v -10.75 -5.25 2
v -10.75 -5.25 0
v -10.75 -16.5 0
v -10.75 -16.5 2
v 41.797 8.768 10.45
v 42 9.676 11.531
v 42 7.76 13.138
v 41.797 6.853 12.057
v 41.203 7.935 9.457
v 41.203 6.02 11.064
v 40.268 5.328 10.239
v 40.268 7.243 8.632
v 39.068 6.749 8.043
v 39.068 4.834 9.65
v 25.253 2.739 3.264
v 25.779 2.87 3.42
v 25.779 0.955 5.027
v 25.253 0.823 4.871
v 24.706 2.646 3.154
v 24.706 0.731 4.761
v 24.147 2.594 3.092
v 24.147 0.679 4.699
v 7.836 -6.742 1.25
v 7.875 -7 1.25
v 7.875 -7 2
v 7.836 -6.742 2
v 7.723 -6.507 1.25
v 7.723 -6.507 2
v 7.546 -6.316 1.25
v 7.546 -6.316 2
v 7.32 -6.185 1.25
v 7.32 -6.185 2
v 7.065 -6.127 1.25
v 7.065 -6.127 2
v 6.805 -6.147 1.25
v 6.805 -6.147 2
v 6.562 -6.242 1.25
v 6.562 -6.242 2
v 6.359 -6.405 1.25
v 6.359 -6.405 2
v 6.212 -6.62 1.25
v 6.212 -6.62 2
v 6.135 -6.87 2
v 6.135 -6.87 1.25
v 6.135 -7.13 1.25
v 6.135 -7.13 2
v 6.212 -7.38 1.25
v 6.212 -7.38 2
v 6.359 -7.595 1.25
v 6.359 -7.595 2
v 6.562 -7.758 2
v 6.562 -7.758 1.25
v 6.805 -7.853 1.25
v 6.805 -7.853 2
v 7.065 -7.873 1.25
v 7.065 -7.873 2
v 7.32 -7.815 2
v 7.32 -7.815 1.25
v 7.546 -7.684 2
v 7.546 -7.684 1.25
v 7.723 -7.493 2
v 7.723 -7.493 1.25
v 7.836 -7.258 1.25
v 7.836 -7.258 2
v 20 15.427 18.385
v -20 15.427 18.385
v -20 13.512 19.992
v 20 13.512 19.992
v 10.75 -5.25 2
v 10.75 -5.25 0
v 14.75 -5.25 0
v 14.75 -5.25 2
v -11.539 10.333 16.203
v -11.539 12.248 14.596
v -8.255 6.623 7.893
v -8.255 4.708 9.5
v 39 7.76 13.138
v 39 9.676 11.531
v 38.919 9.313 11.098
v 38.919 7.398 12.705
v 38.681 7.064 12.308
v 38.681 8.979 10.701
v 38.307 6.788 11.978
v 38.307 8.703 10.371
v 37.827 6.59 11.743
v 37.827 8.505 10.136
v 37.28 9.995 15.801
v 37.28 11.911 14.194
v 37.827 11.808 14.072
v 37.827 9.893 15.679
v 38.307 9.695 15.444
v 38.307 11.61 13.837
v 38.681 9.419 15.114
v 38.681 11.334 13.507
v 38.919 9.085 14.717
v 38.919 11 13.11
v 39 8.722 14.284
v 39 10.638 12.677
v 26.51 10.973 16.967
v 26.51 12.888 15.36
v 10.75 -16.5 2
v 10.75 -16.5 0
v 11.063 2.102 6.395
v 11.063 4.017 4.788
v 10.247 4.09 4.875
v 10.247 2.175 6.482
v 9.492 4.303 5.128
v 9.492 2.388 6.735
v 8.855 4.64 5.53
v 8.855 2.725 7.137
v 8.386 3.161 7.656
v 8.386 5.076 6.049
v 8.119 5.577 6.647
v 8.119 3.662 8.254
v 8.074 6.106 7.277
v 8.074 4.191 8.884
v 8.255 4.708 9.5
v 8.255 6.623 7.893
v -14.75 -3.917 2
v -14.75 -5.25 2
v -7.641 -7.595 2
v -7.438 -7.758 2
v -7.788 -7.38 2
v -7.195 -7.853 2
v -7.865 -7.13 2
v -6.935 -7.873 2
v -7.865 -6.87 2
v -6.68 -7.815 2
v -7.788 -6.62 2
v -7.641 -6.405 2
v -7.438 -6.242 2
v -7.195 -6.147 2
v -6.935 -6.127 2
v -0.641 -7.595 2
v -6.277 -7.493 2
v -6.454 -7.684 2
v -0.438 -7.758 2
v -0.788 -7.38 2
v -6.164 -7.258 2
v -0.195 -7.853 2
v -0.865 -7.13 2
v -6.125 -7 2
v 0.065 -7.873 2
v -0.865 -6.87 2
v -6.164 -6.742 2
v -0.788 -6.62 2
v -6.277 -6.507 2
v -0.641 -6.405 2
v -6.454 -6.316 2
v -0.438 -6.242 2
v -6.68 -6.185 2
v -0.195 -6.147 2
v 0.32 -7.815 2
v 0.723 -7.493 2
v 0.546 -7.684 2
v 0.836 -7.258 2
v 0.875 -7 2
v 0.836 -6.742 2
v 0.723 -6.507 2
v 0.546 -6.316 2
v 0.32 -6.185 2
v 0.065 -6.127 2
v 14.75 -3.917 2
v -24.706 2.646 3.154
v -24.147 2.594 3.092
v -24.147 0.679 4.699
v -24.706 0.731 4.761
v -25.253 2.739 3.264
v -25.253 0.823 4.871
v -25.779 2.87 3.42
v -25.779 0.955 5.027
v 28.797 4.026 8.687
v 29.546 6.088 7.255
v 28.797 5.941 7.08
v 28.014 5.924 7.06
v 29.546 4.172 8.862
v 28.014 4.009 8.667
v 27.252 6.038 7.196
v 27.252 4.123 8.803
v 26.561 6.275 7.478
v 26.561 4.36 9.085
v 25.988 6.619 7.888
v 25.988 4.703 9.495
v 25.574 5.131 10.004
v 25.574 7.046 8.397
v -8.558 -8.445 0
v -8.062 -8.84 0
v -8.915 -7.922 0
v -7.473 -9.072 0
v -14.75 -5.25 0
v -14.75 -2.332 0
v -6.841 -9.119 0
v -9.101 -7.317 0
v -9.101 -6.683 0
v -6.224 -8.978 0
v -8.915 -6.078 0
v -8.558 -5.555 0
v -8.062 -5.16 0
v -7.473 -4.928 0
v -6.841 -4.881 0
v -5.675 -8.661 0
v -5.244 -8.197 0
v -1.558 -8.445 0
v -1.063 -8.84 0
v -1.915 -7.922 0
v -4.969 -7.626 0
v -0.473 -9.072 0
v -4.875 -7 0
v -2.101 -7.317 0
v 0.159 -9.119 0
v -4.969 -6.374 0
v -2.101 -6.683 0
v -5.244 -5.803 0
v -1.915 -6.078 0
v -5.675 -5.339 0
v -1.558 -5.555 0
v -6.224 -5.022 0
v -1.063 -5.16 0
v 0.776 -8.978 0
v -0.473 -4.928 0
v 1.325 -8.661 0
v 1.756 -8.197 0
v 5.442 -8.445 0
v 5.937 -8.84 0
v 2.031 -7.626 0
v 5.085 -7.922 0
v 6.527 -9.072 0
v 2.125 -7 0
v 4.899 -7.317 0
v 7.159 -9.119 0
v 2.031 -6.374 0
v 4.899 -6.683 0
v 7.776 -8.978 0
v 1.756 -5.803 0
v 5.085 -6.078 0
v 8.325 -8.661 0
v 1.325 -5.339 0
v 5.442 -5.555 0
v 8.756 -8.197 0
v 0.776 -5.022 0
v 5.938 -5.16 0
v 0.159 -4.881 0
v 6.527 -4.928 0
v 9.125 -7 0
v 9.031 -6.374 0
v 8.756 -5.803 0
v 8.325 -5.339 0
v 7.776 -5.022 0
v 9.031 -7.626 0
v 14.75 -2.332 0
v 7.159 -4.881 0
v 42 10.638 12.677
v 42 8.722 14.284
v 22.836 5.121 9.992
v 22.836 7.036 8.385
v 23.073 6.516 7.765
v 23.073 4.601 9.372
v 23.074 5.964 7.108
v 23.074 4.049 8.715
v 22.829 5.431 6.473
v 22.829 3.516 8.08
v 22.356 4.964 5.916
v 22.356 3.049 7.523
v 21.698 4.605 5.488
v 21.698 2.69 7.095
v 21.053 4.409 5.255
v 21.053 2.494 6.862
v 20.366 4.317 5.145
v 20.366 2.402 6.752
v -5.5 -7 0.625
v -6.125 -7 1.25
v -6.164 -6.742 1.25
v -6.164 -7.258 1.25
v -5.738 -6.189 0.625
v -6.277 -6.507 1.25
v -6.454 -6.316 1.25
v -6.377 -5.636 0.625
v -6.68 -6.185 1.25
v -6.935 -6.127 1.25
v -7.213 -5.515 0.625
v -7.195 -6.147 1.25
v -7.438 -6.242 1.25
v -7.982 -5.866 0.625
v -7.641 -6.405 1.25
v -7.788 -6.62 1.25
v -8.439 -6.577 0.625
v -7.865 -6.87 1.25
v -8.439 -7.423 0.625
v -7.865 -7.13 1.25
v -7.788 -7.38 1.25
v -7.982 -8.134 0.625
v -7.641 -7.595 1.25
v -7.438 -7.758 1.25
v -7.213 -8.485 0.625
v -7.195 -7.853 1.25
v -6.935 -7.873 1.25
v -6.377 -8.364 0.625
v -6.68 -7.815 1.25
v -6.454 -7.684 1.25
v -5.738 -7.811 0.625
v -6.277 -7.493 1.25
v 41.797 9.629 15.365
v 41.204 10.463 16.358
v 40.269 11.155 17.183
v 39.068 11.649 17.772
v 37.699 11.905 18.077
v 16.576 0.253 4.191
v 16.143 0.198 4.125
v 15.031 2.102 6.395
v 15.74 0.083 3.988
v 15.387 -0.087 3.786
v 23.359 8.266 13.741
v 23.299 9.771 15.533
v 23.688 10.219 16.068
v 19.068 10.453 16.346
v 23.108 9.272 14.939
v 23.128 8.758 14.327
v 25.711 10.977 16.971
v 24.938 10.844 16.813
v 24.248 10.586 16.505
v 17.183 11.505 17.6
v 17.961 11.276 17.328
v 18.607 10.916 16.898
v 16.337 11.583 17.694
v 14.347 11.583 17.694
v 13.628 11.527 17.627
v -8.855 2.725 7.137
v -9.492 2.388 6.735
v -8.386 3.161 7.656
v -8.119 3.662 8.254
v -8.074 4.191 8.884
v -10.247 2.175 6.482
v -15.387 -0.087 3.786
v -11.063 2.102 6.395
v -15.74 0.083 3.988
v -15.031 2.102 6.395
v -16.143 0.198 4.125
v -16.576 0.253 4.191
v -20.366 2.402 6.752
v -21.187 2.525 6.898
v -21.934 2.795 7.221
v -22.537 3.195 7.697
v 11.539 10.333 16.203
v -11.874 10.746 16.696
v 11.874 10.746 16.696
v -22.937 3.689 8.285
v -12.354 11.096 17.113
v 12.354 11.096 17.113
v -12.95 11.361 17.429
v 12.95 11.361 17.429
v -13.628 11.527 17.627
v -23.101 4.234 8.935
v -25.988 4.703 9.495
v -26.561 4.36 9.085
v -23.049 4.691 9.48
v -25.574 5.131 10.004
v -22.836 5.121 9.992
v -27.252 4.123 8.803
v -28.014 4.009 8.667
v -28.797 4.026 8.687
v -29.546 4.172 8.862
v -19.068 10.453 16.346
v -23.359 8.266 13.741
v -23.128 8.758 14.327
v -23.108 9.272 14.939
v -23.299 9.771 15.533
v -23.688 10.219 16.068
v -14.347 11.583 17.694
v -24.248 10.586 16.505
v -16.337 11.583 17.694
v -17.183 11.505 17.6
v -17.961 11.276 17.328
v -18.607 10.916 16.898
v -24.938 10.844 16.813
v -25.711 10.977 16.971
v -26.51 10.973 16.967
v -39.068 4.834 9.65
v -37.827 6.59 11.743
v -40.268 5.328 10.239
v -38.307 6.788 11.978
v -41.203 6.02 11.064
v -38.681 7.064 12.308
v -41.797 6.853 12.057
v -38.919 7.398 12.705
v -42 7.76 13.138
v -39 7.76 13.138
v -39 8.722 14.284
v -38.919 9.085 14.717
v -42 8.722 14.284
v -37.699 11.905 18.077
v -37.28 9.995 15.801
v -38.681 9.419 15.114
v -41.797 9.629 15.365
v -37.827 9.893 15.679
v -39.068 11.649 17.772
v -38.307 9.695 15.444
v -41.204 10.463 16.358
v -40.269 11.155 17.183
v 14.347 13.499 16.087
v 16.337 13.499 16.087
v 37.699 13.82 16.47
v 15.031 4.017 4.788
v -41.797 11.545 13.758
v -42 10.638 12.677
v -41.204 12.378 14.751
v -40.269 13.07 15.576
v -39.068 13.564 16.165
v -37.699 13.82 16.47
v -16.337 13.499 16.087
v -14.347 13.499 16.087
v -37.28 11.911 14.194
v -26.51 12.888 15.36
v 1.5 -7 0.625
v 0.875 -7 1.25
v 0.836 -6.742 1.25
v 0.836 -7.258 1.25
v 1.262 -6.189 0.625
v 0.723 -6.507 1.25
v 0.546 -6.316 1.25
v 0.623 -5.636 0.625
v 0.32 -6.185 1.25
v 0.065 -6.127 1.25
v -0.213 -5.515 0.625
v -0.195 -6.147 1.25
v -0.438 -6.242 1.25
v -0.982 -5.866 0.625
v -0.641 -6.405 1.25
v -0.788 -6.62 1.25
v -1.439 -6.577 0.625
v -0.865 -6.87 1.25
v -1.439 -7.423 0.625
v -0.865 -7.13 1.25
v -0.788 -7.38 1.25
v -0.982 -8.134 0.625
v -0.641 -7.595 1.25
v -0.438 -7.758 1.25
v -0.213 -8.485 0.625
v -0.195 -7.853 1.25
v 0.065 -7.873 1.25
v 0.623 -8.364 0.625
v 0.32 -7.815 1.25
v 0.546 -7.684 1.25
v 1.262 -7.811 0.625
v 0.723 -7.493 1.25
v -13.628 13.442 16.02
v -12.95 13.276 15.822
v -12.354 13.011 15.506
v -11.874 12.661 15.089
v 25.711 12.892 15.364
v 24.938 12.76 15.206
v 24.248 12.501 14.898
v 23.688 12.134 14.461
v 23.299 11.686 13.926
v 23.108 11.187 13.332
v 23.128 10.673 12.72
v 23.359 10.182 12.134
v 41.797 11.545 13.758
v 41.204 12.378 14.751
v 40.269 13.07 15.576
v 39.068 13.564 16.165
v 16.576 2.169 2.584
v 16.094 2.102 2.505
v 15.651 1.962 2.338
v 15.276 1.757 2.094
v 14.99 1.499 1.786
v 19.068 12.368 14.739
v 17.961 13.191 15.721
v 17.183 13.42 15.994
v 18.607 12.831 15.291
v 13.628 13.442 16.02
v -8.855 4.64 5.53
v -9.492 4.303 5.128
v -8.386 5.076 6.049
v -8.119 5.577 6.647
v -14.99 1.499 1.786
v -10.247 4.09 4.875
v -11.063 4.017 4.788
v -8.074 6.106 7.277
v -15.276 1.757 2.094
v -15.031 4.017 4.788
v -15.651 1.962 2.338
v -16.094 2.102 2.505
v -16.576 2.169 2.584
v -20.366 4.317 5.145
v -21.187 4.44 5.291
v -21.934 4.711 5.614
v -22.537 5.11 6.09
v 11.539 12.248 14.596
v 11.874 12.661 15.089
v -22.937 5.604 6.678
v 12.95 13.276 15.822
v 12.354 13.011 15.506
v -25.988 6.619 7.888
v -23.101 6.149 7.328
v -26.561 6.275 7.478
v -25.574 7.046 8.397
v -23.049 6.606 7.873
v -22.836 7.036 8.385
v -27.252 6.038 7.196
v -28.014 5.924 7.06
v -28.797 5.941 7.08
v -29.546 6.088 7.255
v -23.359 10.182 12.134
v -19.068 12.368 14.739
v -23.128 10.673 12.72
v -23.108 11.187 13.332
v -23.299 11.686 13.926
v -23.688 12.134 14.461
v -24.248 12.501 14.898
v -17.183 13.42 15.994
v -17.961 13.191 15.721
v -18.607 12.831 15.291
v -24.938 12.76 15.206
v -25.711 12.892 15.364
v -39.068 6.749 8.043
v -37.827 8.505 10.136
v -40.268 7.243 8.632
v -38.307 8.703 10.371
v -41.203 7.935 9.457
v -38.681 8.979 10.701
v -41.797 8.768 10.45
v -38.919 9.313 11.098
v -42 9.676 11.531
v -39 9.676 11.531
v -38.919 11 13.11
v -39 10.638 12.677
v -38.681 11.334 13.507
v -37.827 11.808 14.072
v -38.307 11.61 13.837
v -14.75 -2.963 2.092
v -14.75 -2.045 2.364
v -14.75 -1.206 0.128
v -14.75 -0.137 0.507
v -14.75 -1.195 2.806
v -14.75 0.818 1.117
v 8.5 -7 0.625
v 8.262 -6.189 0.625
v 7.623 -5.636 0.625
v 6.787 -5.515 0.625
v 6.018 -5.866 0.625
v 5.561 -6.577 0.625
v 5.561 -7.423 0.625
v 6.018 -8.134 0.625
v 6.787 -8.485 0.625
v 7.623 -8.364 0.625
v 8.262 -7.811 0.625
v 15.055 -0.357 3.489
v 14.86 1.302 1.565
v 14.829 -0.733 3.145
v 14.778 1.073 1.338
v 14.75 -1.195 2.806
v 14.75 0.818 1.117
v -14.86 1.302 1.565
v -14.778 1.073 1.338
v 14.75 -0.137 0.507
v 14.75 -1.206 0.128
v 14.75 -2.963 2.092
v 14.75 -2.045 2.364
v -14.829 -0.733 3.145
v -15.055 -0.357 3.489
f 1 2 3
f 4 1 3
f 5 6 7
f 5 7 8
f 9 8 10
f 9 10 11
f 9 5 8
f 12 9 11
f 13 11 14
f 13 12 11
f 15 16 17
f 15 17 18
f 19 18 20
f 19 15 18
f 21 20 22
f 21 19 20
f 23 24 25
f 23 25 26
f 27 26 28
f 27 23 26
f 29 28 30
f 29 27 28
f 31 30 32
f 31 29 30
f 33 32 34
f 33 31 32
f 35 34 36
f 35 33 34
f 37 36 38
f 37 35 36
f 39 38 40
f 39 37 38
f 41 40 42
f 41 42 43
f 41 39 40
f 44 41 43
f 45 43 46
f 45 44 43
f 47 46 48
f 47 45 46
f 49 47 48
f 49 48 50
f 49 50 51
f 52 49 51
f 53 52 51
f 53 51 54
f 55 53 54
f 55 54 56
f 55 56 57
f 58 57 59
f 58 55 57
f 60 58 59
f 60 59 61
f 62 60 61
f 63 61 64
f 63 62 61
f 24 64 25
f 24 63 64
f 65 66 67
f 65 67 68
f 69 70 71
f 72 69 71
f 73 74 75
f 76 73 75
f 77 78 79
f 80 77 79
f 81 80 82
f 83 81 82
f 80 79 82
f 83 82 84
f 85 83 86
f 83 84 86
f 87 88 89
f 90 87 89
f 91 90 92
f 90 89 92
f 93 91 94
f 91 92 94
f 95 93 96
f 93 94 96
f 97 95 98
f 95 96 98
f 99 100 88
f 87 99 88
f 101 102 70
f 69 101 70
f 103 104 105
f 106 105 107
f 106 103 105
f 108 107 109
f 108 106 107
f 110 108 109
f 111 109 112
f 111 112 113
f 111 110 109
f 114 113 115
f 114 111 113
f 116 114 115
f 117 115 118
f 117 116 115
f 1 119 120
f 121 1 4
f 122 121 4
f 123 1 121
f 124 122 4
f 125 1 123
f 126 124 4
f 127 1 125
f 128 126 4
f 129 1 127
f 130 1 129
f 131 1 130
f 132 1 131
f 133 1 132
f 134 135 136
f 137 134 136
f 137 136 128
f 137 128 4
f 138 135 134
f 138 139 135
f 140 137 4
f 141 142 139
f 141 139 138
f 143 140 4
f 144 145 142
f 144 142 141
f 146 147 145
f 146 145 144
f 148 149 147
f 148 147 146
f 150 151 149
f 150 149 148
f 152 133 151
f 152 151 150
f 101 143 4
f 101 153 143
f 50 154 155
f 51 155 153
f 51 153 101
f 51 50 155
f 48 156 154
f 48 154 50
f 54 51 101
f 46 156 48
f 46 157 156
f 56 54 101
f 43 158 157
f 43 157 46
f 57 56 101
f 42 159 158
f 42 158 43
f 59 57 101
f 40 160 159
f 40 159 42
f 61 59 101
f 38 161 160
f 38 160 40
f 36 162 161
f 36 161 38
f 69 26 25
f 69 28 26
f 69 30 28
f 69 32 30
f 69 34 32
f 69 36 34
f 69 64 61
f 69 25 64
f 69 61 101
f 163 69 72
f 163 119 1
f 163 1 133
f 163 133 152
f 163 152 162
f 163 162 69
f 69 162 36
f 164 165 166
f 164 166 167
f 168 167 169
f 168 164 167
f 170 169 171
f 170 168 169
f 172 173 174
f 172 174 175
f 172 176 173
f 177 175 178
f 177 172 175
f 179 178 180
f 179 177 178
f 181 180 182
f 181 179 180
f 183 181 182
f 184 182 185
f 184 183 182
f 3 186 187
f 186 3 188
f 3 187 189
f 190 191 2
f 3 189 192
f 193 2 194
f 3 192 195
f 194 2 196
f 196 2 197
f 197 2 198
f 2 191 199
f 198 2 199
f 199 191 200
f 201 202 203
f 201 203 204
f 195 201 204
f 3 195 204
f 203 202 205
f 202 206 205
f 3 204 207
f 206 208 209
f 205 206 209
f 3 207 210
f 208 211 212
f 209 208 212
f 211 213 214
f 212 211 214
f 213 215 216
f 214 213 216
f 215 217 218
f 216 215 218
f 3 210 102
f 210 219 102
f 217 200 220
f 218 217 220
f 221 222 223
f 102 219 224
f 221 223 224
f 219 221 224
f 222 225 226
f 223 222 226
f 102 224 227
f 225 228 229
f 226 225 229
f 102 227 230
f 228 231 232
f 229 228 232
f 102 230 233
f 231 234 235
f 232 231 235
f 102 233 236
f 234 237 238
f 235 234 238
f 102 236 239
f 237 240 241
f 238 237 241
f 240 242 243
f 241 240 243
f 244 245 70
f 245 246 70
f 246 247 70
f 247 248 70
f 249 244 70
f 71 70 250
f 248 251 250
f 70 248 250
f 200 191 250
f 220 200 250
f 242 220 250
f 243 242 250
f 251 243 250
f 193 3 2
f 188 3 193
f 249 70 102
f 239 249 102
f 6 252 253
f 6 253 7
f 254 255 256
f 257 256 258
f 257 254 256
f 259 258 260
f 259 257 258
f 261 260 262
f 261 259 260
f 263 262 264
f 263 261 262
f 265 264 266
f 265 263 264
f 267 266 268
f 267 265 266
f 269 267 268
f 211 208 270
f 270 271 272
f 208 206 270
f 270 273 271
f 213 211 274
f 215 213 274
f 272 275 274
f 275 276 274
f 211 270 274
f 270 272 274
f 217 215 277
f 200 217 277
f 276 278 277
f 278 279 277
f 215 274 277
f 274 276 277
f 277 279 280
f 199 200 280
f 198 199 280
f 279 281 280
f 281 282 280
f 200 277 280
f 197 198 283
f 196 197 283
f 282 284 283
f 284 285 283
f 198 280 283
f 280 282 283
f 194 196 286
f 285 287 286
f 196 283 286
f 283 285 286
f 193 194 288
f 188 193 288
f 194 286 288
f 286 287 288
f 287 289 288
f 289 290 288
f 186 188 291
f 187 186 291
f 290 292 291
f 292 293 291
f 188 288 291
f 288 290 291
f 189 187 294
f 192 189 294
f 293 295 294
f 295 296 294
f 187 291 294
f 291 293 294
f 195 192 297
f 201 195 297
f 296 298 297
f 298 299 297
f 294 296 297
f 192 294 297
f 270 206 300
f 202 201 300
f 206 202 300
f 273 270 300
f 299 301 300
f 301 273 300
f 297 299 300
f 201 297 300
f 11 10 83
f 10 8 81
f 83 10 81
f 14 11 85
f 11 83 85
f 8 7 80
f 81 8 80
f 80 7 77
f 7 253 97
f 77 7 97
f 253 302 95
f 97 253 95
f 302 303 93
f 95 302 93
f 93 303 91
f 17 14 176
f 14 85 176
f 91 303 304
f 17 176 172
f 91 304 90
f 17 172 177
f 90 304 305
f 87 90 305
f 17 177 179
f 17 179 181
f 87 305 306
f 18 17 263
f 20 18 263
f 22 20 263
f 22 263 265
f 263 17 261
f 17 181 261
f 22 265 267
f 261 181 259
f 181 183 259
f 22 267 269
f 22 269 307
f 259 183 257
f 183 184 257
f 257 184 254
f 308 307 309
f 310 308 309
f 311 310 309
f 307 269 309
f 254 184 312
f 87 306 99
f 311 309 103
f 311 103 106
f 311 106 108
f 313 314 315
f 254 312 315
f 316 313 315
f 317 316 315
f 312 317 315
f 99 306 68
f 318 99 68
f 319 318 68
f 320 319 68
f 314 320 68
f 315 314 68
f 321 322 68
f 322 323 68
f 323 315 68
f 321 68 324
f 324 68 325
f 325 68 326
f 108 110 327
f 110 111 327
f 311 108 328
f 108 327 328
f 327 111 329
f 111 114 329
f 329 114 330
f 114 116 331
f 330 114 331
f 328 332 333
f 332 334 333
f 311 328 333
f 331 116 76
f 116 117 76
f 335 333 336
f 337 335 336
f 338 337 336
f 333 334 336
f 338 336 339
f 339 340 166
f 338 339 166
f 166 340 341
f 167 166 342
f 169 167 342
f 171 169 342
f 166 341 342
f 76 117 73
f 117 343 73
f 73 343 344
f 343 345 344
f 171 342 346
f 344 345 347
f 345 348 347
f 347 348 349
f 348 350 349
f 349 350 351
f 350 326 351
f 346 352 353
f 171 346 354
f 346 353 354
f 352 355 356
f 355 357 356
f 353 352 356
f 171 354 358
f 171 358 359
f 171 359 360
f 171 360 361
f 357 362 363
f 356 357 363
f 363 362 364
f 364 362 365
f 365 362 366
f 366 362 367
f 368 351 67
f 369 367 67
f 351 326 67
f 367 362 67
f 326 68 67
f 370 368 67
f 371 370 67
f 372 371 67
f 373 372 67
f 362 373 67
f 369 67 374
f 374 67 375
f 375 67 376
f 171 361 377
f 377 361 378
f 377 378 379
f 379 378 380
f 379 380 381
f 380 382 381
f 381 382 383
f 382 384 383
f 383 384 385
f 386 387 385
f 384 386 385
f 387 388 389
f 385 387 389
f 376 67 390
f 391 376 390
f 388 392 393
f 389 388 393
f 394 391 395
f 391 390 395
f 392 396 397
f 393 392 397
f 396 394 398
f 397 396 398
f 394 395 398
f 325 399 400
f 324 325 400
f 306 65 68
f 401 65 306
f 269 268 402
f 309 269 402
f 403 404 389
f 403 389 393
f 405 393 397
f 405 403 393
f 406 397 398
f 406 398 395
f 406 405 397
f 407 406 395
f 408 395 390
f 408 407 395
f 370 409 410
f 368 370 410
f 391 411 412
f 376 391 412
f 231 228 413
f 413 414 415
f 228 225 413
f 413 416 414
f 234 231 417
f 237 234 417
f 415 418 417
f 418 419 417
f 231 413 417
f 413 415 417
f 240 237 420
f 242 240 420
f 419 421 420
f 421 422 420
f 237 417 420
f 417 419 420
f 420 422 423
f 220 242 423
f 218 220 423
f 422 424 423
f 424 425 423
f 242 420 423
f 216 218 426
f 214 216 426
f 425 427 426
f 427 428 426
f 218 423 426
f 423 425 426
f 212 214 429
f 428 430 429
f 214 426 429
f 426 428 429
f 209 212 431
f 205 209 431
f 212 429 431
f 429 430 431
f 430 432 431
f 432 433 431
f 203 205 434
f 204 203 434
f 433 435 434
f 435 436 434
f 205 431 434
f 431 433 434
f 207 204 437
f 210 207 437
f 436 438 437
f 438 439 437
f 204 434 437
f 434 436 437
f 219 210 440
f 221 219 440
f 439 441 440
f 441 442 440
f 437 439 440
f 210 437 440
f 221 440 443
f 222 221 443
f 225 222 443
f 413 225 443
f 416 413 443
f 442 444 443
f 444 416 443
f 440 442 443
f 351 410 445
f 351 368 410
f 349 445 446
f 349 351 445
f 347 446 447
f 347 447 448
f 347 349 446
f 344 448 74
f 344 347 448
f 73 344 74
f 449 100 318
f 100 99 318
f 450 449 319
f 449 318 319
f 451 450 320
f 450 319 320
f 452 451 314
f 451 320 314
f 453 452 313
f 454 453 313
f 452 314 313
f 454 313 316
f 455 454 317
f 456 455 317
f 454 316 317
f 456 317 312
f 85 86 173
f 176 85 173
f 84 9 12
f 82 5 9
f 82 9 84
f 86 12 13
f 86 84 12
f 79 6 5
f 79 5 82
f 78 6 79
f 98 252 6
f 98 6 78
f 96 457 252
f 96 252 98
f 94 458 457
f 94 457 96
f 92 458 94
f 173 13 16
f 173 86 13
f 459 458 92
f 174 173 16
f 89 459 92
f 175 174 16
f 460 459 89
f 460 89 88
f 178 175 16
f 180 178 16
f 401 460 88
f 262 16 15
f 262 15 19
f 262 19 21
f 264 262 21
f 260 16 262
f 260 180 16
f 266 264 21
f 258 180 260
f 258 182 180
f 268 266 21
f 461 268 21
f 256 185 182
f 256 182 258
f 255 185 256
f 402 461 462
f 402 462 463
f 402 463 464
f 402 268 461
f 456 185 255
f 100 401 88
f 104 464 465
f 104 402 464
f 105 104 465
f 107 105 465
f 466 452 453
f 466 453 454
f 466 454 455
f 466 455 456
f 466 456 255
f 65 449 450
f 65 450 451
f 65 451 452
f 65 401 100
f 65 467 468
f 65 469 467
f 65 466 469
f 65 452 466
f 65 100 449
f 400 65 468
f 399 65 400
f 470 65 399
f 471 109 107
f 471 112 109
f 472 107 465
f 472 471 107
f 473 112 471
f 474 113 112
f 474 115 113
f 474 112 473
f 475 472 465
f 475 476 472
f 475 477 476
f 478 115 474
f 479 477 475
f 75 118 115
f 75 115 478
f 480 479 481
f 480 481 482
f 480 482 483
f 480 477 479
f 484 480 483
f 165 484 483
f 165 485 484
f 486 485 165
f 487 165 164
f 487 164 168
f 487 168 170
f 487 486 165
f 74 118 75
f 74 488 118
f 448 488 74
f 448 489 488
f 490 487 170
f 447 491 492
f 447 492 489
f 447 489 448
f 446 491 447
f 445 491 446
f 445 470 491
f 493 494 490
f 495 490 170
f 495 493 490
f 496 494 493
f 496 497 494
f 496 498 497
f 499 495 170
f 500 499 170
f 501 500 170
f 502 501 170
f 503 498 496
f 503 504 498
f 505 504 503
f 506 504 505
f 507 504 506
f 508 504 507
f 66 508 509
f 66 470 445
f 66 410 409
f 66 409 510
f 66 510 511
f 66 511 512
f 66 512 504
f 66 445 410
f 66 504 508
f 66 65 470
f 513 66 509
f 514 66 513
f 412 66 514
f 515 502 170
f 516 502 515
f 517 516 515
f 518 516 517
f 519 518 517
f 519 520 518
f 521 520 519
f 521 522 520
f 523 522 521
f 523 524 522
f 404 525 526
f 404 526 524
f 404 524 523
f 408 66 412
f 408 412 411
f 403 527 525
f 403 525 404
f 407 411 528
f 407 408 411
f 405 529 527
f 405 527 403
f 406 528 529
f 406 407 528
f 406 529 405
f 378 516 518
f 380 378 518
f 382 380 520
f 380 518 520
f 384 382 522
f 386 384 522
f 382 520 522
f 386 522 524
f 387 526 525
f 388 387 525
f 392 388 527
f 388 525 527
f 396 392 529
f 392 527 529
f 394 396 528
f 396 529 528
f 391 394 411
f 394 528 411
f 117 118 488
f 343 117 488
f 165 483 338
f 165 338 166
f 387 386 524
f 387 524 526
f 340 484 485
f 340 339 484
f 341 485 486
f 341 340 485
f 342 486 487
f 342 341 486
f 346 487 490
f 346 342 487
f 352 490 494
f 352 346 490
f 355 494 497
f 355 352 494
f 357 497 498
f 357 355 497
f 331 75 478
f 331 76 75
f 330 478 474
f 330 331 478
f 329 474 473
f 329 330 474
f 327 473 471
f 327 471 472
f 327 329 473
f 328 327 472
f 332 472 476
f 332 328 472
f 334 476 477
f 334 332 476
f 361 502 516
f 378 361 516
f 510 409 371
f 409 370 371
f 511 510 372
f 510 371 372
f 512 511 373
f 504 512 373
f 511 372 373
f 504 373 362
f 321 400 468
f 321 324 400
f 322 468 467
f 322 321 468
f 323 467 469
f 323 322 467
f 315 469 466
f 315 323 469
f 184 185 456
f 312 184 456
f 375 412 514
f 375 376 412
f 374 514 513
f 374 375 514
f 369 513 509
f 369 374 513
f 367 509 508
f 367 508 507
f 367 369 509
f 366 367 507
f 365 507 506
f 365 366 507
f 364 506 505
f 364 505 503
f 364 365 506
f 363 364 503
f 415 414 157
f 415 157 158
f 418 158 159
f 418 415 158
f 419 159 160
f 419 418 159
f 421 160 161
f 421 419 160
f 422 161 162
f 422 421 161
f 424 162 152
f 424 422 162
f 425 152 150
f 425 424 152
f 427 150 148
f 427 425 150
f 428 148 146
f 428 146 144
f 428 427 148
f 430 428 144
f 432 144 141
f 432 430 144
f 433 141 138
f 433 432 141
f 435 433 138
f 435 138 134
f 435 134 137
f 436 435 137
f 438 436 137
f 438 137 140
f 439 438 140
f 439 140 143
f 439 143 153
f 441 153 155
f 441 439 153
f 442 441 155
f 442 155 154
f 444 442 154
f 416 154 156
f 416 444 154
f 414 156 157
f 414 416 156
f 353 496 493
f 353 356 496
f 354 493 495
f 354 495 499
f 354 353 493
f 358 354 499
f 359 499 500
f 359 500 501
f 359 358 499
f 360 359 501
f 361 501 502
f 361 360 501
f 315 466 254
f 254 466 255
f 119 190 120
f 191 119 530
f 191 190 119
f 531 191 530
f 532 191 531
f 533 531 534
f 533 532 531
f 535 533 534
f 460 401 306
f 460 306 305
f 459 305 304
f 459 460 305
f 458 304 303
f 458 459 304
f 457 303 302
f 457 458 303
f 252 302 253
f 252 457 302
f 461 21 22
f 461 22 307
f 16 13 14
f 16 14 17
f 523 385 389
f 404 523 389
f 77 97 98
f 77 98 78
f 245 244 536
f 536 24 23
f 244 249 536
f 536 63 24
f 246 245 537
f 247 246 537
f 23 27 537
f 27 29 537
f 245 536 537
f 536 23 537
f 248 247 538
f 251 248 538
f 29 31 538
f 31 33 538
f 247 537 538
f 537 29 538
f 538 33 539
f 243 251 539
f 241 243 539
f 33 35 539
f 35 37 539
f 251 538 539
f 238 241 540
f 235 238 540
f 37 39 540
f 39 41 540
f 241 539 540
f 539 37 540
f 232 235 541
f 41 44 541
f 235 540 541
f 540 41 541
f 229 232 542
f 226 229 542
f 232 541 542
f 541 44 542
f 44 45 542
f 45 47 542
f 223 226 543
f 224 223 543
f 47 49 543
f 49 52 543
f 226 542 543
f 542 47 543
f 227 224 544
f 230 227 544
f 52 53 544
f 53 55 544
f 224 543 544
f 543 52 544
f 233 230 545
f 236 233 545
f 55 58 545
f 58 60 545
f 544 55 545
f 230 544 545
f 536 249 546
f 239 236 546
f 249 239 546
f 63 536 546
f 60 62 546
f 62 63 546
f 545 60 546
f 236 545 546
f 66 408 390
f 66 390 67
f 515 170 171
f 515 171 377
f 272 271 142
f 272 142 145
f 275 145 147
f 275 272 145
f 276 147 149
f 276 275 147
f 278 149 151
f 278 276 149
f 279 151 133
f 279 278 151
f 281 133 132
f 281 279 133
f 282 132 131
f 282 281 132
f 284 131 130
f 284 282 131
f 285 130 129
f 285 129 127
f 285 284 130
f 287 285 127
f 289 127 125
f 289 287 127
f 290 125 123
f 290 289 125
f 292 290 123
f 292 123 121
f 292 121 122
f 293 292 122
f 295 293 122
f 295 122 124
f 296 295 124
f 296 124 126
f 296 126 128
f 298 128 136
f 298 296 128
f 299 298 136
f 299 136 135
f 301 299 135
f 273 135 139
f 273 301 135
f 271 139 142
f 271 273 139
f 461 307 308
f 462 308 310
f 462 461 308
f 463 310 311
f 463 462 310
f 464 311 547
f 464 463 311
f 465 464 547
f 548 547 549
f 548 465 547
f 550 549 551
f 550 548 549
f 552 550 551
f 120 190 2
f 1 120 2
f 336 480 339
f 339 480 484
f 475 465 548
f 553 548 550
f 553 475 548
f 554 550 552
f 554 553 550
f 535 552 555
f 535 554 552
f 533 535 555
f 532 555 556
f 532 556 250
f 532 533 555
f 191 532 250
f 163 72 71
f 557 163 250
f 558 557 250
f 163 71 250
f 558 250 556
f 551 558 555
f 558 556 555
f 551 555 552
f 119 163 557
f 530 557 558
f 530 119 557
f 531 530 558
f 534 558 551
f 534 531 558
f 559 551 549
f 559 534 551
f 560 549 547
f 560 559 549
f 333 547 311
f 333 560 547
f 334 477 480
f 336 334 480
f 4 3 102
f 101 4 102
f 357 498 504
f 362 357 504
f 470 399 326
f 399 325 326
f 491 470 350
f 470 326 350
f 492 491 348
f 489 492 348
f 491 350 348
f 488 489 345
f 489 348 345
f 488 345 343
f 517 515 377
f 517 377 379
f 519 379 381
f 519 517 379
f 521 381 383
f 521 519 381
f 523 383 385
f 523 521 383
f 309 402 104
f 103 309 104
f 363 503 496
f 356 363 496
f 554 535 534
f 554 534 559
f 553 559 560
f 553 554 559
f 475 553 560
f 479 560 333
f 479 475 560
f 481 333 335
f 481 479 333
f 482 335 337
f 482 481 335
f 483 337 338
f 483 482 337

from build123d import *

# Parameters (mm, degrees)
F0_R     = 0.875
F1_DEPTH = 2
F4_DEPTH = 2.5
F6_DEPTH = 25.4913661255
F7_R     = 5
F8_R     = 3
F9_SIZE  = 1.25


with BuildPart() as f1:
    # F0 (on Top) → F1 (new body)
    with BuildSketch(Plane.XY):
        Polygon((14.75, 0), (0, 0), (-14.75, 0), (-14.75, -5.25), (-10.75, -5.25), (-10.75, -16.5), (0, -16.5), (10.75, -16.5), (10.75, -5.25), (14.75, -5.25), align=None)
        with Locations((-7, -7)):
            Circle(F0_R, mode=Mode.SUBTRACT)
        with Locations((0, -7)):
            Circle(F0_R, mode=Mode.SUBTRACT)
        with Locations((7, -7)):
            Circle(F0_R, mode=Mode.SUBTRACT)
    extrude(amount=F1_DEPTH)

    # F3 (on face) → F4 (join)
    with BuildSketch(Plane(origin=(0, 0, 0), x_dir=(-1, 0, 0), z_dir=(0, 0.7660444431, -0.6427876097))):
        with BuildLine():
            Line((-14.75, 0), (14.75, 0))
            Line((14.75, 0), (14.75, 1.3812757004))
            ThreePointArc((14.75, 1.3812757004), (15.2754453264, 2.7324561156), (16.5756885145, 3.3736650966))
            Line((16.5756885145, 3.3736650966), (24.147387942, 4.0361029601))
            ThreePointArc((24.147387942, 4.0361029601), (24.9815296917, 4.1810344722), (25.7792604037, 4.464624516))
            Line((25.7792604037, 4.464624516), (39.0676511754, 10.5))
            ThreePointArc((39.0676511754, 10.5), (41.2034661814, 12.3448936136), (42, 15.0524519346))
            Line((42, 15.0524519346), (42, 16.5491437132))
            ThreePointArc((42, 16.5491437132), (40.7746857814, 19.8281294179), (37.6993010994, 21.5))
            Line((37.6993010994, 21.5), (20, 24))
            Line((20, 24), (0, 24))
            Line((0, 24), (-20, 24))
            Line((-20, 24), (-37.6993010994, 21.5))
            ThreePointArc((-37.6993010994, 21.5), (-40.7746857814, 19.8281294179), (-42, 16.5491437132))
            Line((-42, 16.5491437132), (-42, 15.0524519346))
            ThreePointArc((-42, 15.0524519346), (-41.2034661814, 12.3448936136), (-39.0676511754, 10.5))
            Line((-39.0676511754, 10.5), (-25.7792604037, 4.464624516))
            ThreePointArc((-25.7792604037, 4.464624516), (-24.9815296917, 4.1810344722), (-24.147387942, 4.0361029601))
            Line((-24.147387942, 4.0361029601), (-16.5756885145, 3.3736650966))
            ThreePointArc((-16.5756885145, 3.3736650966), (-15.2754453264, 2.7324561156), (-14.75, 1.3812757004))
            Line((-14.75, 1.3812757004), (-14.75, 0))
        make_face()
    extrude(amount=-F4_DEPTH)

    # F5 (on face) → F6 (cut, through all)
    with BuildSketch(Plane(origin=(0, 0, 0), x_dir=(-1, 0, 0), z_dir=(0, 0.7660444431, -0.6427876097))):
        with BuildLine():
            Line((-21.098955464, 20.8149952552), (-37.2797204398, 18.5294862279))
            ThreePointArc((-37.2797204398, 18.5294862279), (-38.5098743126, 17.8607379951), (-39, 16.5491437132))
            Line((-39, 16.5491437132), (-39, 15.0524519346))
            ThreePointArc((-39, 15.0524519346), (-38.6813864726, 13.9694286062), (-37.8270604702, 13.2314711608))
            Line((-37.8270604702, 13.2314711608), (-26.8148956657, 8.2299212644))
            Line((-26.8148956657, 8.2299212644), (-21.098955464, 20.8149952552))
        make_face()
        with BuildLine():
            Line((-12.2691561683, 21), (-18.2691561683, 21))
            Line((-18.2691561683, 21), (-24.5386696984, 7.1960956767))
            ThreePointArc((-24.5386696984, 7.1960956767), (-24.2195774136, 7.0826596592), (-23.8859207138, 7.0246870544))
            Line((-23.8859207138, 7.0246870544), (-15.0312071638, 6.25))
            Line((-15.0312071638, 6.25), (-6.732866085, 6.25))
            Line((-6.732866085, 6.25), (-12.2691561683, 21))
        make_face()
        with BuildLine():
            Line((18.2691561683, 21), (12.2691561683, 21))
            Line((12.2691561683, 21), (6.732866085, 6.25))
            Line((6.732866085, 6.25), (15.0312071638, 6.25))
            Line((15.0312071638, 6.25), (23.8859207138, 7.0246870544))
            ThreePointArc((23.8859207138, 7.0246870544), (24.2195774136, 7.0826596592), (24.5386696984, 7.1960956767))
            Line((24.5386696984, 7.1960956767), (18.2691561683, 21))
        make_face()
        with BuildLine():
            Line((37.2797204398, 18.5294862279), (21.098955464, 20.8149952552))
            Line((21.098955464, 20.8149952552), (26.8148956657, 8.2299212644))
            Line((26.8148956657, 8.2299212644), (37.8270604702, 13.2314711608))
            ThreePointArc((37.8270604702, 13.2314711608), (38.6813864726, 13.9694286062), (39, 15.0524519346))
            Line((39, 15.0524519346), (39, 16.5491437132))
            ThreePointArc((39, 16.5491437132), (38.5098743126, 17.8607379951), (37.2797204398, 18.5294862279))
        make_face()
    extrude(amount=-F6_DEPTH, mode=Mode.SUBTRACT)

    # F7 (call 1 of 2: OpenCascade refuses the feature's edges together)
    f7_edges = [f1.edges().sort_by_distance(p)[0] for p in [
        (0, -1.585319, 2),
    ]]
    fillet(f7_edges, radius=F7_R)

    # F7#2 (call 2 of 2)
    f7_2_edges = [f1.edges().sort_by_distance(p)[0] for p in [
        (0, 0, 0),
    ]]
    fillet(f7_2_edges, radius=F7_R)

    # F8
    f8_edges = [f1.edges().sort_by_distance(p)[0] for p in [
        (-21.098955, 12.422065, 16.748696),
        (-26.814896, 4.332536, 7.10797),
        (-24.53867, 3.668006, 6.316014),
        (-6.732866, 3.059867, 5.591262),
        (-12.269156, 12.540984, 16.890418),
        (-18.269156, 12.540984, 16.890418),
        (12.269156, 12.540984, 16.890418),
        (18.269156, 12.540984, 16.890418),
        (24.53867, 3.668006, 6.316014),
        (6.732866, 3.059867, 5.591262),
        (26.814896, 4.332536, 7.10797),
        (21.098955, 12.422065, 16.748696),
    ]]
    fillet(f8_edges, radius=F8_R)

    # F9
    f9_edges = [f1.edges().sort_by_distance(p)[0] for p in [
        (-7.875, -7, 0),
        (-0.875, -7, 0),
        (6.125, -7, 0),
    ]]
    chamfer(f9_edges, length=F9_SIZE)


solid = f1.part
